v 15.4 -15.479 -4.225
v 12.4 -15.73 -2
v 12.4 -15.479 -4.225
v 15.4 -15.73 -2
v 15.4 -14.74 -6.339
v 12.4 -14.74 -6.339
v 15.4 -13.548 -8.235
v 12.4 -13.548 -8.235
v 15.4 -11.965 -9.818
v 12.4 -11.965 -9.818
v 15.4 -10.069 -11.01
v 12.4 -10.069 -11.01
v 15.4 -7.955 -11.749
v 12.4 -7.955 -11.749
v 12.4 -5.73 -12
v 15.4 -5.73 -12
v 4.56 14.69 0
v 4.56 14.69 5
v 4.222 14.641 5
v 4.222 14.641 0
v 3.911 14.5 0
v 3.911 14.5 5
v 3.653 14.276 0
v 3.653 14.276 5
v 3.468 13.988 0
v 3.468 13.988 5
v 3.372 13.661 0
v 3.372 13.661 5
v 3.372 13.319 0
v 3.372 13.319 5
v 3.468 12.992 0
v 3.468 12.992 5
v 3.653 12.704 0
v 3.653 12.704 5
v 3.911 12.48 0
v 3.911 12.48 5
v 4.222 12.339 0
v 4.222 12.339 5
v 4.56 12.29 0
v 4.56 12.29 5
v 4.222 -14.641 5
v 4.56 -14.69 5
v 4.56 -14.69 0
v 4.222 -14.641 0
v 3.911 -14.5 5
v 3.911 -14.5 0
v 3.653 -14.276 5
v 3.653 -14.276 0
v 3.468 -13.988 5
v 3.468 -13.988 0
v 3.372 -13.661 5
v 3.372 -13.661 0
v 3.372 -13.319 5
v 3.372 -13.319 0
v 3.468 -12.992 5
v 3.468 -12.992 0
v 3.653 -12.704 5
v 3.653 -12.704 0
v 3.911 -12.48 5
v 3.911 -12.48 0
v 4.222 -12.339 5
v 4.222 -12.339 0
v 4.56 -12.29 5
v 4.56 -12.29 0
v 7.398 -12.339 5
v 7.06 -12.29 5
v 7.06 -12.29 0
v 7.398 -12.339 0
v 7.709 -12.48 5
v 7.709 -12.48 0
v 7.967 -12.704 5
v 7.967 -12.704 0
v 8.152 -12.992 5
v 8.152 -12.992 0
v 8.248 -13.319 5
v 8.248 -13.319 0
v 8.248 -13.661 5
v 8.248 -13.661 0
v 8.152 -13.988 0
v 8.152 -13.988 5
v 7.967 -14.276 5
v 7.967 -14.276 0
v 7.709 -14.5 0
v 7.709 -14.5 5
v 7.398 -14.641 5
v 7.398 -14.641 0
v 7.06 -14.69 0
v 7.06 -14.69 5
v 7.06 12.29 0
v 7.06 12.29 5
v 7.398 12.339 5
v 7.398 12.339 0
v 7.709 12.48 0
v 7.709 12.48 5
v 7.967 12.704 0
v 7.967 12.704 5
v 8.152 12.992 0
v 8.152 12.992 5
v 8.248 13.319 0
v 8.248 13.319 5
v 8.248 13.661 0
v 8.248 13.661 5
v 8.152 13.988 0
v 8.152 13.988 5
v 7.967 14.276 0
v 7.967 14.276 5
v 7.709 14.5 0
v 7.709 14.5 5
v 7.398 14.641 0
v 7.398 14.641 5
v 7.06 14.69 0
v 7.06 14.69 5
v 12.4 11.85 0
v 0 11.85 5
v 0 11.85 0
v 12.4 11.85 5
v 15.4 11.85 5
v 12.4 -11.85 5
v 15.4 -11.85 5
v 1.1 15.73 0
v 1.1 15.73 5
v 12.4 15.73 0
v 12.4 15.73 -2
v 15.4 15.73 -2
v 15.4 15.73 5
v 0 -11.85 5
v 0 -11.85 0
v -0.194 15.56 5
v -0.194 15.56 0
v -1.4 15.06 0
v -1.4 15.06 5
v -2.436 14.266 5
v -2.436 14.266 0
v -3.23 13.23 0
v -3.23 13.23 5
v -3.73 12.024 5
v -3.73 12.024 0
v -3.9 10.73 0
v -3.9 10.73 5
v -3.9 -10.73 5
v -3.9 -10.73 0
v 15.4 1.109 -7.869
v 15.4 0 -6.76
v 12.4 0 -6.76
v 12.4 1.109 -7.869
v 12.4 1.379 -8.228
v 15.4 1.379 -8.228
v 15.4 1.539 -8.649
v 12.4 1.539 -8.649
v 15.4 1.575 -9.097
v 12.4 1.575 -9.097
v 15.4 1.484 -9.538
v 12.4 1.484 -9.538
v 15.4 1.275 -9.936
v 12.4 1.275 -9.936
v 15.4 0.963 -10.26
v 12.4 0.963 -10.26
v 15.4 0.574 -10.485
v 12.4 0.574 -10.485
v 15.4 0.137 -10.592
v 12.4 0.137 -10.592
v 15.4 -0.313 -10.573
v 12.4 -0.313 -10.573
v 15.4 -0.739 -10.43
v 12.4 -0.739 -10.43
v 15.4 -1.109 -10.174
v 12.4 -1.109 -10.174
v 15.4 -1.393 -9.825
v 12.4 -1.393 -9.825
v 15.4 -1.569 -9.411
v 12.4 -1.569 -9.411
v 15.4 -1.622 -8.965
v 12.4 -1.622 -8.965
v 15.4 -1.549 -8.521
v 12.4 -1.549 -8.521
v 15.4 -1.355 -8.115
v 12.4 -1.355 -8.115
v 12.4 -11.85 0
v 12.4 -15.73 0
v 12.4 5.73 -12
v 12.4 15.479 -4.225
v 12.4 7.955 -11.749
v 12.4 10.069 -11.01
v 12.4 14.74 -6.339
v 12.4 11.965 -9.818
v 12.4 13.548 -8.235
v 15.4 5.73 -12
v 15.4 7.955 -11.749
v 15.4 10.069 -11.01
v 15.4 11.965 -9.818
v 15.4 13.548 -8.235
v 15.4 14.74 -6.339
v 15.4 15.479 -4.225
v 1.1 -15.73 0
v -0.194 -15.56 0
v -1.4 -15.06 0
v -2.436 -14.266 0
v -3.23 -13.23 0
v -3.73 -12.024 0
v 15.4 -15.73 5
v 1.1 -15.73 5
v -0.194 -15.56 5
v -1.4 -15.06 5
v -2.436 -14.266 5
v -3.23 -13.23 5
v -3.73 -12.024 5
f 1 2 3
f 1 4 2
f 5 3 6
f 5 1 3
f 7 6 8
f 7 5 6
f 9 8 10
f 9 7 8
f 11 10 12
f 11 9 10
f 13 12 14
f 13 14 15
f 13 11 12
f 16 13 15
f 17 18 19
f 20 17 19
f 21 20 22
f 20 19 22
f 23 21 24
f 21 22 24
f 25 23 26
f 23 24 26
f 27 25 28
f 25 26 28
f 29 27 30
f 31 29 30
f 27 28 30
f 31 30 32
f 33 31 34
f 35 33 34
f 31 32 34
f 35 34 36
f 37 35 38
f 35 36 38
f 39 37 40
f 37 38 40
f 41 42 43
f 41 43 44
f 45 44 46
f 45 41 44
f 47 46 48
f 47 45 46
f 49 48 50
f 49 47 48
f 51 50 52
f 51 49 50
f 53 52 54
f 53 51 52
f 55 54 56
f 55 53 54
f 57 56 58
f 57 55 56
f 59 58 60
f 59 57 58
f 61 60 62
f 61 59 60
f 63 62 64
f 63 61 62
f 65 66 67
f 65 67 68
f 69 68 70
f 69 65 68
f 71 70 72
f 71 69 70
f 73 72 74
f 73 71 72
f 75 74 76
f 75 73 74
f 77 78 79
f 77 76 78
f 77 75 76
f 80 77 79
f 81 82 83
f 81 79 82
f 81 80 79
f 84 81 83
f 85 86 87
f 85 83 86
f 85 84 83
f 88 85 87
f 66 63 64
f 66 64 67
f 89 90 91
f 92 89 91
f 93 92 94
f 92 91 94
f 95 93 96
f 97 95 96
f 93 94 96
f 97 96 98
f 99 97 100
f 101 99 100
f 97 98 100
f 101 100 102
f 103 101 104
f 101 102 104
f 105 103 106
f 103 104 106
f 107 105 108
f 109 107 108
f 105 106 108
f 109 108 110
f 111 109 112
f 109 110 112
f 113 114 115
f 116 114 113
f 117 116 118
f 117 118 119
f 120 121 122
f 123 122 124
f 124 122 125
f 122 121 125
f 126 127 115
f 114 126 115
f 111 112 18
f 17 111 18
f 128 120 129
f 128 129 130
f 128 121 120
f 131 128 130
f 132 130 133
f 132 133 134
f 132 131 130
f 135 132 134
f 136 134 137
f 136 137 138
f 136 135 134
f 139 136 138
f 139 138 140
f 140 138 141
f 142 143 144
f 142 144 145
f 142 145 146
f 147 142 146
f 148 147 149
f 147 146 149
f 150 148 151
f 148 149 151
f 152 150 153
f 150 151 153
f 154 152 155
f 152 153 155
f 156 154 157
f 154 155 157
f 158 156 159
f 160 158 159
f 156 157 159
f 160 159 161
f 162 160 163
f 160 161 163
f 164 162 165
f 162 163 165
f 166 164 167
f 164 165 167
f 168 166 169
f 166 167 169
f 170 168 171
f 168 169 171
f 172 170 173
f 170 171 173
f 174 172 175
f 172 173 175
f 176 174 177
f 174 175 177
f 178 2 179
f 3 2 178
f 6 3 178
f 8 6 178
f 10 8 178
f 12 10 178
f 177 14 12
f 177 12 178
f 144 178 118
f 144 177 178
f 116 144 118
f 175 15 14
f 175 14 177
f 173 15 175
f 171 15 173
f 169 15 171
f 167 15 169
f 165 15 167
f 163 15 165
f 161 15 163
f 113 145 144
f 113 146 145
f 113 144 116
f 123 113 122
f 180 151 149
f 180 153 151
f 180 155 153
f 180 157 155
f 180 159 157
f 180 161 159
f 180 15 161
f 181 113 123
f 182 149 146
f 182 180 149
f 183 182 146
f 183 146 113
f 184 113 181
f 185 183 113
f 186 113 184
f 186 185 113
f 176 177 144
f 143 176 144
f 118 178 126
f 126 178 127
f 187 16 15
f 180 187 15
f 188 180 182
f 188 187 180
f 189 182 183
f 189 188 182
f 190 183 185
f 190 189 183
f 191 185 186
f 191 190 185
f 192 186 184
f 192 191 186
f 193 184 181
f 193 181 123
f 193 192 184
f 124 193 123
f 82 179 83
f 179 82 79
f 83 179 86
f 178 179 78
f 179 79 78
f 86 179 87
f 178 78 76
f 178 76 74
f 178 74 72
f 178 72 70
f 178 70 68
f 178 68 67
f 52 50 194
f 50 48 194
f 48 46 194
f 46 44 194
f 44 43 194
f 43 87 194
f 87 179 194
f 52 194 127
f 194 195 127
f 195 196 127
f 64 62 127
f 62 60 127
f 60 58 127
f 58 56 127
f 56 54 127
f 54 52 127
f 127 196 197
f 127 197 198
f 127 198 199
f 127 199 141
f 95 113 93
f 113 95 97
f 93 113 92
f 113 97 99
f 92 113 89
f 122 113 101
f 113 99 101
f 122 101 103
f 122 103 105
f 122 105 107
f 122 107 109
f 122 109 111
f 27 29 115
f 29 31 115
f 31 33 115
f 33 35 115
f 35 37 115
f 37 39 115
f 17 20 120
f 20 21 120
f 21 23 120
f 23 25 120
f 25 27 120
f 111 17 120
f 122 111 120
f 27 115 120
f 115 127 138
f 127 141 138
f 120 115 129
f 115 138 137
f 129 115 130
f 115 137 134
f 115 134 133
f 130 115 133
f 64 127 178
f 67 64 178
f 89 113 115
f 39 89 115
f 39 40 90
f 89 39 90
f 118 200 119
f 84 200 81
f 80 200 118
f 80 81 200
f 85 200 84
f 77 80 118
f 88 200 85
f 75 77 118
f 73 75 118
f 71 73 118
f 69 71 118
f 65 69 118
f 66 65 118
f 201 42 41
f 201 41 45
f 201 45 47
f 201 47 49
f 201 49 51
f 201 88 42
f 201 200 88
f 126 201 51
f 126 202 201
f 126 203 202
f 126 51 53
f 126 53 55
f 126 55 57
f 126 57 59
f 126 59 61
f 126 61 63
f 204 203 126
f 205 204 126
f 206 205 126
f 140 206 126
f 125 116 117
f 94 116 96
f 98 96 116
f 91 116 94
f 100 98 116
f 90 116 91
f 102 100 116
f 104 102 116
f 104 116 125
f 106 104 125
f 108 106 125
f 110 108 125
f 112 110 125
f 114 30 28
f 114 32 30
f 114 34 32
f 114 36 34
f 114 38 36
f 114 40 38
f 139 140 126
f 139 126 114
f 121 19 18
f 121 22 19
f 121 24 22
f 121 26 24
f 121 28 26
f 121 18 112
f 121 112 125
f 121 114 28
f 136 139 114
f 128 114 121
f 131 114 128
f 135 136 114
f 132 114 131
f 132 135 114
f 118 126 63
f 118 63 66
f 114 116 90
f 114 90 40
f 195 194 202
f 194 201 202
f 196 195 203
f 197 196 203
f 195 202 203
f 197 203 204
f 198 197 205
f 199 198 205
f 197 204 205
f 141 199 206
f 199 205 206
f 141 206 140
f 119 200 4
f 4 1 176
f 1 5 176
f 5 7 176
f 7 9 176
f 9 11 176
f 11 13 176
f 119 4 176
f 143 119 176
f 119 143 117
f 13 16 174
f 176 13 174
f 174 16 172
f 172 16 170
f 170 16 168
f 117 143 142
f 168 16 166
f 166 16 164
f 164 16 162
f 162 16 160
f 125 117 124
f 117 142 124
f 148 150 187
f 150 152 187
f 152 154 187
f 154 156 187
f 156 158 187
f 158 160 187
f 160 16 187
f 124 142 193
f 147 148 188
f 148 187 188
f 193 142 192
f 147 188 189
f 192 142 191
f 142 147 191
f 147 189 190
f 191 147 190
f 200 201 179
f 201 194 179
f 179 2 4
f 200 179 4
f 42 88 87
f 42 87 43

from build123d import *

# Parameters (mm, degrees)
BOSS_EXTRUDE2_DEPTH = 5
CUT_EXTRUDE1_DEPTH  = 23.574164436
SKETCH3_W           = 3
SKETCH3_H           = 3.88
BOSS_EXTRUDE3_DEPTH = 12
BOSS_EXTRUDE4_REACH = 35.791
SKETCH4_W           = 3
SKETCH4_H           = 6.078503162
SKETCH6_W           = 3
SKETCH6_H           = 23.7
BOSS_EXTRUDE5_DEPTH = 10.921497
CUT_EXTRUDE2_DEPTH  = 26.634408517
FILLET1_R           = 10
FILLET2_R           = 5


with BuildPart() as part:
    # Sketch1 → Boss-Extrude2 (new body)
    with BuildSketch(Plane(origin=(0, 0, 0), x_dir=(0, 1, 0), z_dir=(0, 0, 1))):
        Polygon((-11.85, 0), (11.85, 0), (11.85, -12.4), (11.85, -15.4), (15.73, -15.4), (15.73, -12.4), (15.73, -0.1), (15.73, 3.9), (-15.73, 3.9), (-15.73, -0.1), (-15.73, -12.4), (-15.73, -15.4), (-11.85, -15.4), (-11.85, -12.4), align=None)
    extrude(amount=BOSS_EXTRUDE2_DEPTH)

    # Sketch2 → Cut-Extrude1 (cut, through all)
    with BuildSketch(Plane.XY.offset(5)):
        with BuildLine():
            Line((4.56, -12.29), (7.06, -12.29))
            ThreePointArc((7.06, -12.29), (8.26, -13.49), (7.06, -14.69))
            Line((7.06, -14.69), (4.56, -14.69))
            ThreePointArc((4.56, -14.69), (3.36, -13.49), (4.56, -12.29))
        make_face()
        with BuildLine():
            Line((4.56, 12.29), (7.06, 12.29))
            ThreePointArc((7.06, 12.29), (8.26, 13.49), (7.06, 14.69))
            Line((7.06, 14.69), (4.56, 14.69))
            ThreePointArc((4.56, 14.69), (3.36, 13.49), (4.56, 12.29))
        make_face()
    extrude(amount=-CUT_EXTRUDE1_DEPTH, mode=Mode.SUBTRACT)

    # Sketch3 → Boss-Extrude3 (add)
    with BuildSketch(Plane(origin=(0, 0, 0), x_dir=(1, 0, 0), z_dir=(0, 0, -1))):
        with Locations((13.9, -13.79)):
            Rectangle(SKETCH3_W, SKETCH3_H)
        with Locations((13.9, 13.79)):
            Rectangle(SKETCH3_W, SKETCH3_H)
    extrude(amount=BOSS_EXTRUDE3_DEPTH)

    # Sketch4 → Boss-Extrude4 (add, up to next)
    with BuildSketch(Plane(origin=(0, -11.85, 0), x_dir=(-1, 0, 0), z_dir=(0, 1, 0)), mode=Mode.PRIVATE) as boss_extrude4_sk1:
        with Locations((-13.9, -8.960748419)):
            Rectangle(SKETCH4_W, SKETCH4_H)
    boss_extrude4_tool1 = extrude(boss_extrude4_sk1.sketch, amount=BOSS_EXTRUDE4_REACH, mode=Mode.PRIVATE) - part.part
    add(boss_extrude4_tool1.solids().sort_by_distance((13.9, -11.85, -8.960748))[0])

    # Sketch6 → Boss-Extrude5 (add)
    with BuildSketch(Plane.XY.offset(-5.921496838)):
        with Locations((13.9, 0)):
            Rectangle(SKETCH6_W, SKETCH6_H)
    extrude(amount=BOSS_EXTRUDE5_DEPTH)

    # Sketch5 → Cut-Extrude2 (cut, through all)
    with BuildSketch(Plane(origin=(12.4, 0, 0), x_dir=(0, -1, 0), z_dir=(-1, 0, 0))):
        with BuildLine():
            Line((0, -6.759630835), (-1.108998315, -7.86862915))
            ThreePointArc((-1.108998315, -7.86862915), (-0.136723769, -10.592070465), (1.355251929, -8.114882764))
            Line((1.355251929, -8.114882764), (0, -6.759630835))
        make_face()
    extrude(amount=-CUT_EXTRUDE2_DEPTH, mode=Mode.SUBTRACT)

    # Fillet1
    fillet1_edges = [part.edges().sort_by_distance(p)[0] for p in [
        (13.9, 15.73, -12),
        (13.9, -15.73, -12),
    ]]
    fillet(fillet1_edges, radius=FILLET1_R)

    # Fillet2
    fillet2_edges = [part.edges().sort_by_distance(p)[0] for p in [
        (-3.9, -15.73, 2.5),
        (-3.9, 15.73, 2.5),
    ]]
    fillet(fillet2_edges, radius=FILLET2_R)


solid = part.part
